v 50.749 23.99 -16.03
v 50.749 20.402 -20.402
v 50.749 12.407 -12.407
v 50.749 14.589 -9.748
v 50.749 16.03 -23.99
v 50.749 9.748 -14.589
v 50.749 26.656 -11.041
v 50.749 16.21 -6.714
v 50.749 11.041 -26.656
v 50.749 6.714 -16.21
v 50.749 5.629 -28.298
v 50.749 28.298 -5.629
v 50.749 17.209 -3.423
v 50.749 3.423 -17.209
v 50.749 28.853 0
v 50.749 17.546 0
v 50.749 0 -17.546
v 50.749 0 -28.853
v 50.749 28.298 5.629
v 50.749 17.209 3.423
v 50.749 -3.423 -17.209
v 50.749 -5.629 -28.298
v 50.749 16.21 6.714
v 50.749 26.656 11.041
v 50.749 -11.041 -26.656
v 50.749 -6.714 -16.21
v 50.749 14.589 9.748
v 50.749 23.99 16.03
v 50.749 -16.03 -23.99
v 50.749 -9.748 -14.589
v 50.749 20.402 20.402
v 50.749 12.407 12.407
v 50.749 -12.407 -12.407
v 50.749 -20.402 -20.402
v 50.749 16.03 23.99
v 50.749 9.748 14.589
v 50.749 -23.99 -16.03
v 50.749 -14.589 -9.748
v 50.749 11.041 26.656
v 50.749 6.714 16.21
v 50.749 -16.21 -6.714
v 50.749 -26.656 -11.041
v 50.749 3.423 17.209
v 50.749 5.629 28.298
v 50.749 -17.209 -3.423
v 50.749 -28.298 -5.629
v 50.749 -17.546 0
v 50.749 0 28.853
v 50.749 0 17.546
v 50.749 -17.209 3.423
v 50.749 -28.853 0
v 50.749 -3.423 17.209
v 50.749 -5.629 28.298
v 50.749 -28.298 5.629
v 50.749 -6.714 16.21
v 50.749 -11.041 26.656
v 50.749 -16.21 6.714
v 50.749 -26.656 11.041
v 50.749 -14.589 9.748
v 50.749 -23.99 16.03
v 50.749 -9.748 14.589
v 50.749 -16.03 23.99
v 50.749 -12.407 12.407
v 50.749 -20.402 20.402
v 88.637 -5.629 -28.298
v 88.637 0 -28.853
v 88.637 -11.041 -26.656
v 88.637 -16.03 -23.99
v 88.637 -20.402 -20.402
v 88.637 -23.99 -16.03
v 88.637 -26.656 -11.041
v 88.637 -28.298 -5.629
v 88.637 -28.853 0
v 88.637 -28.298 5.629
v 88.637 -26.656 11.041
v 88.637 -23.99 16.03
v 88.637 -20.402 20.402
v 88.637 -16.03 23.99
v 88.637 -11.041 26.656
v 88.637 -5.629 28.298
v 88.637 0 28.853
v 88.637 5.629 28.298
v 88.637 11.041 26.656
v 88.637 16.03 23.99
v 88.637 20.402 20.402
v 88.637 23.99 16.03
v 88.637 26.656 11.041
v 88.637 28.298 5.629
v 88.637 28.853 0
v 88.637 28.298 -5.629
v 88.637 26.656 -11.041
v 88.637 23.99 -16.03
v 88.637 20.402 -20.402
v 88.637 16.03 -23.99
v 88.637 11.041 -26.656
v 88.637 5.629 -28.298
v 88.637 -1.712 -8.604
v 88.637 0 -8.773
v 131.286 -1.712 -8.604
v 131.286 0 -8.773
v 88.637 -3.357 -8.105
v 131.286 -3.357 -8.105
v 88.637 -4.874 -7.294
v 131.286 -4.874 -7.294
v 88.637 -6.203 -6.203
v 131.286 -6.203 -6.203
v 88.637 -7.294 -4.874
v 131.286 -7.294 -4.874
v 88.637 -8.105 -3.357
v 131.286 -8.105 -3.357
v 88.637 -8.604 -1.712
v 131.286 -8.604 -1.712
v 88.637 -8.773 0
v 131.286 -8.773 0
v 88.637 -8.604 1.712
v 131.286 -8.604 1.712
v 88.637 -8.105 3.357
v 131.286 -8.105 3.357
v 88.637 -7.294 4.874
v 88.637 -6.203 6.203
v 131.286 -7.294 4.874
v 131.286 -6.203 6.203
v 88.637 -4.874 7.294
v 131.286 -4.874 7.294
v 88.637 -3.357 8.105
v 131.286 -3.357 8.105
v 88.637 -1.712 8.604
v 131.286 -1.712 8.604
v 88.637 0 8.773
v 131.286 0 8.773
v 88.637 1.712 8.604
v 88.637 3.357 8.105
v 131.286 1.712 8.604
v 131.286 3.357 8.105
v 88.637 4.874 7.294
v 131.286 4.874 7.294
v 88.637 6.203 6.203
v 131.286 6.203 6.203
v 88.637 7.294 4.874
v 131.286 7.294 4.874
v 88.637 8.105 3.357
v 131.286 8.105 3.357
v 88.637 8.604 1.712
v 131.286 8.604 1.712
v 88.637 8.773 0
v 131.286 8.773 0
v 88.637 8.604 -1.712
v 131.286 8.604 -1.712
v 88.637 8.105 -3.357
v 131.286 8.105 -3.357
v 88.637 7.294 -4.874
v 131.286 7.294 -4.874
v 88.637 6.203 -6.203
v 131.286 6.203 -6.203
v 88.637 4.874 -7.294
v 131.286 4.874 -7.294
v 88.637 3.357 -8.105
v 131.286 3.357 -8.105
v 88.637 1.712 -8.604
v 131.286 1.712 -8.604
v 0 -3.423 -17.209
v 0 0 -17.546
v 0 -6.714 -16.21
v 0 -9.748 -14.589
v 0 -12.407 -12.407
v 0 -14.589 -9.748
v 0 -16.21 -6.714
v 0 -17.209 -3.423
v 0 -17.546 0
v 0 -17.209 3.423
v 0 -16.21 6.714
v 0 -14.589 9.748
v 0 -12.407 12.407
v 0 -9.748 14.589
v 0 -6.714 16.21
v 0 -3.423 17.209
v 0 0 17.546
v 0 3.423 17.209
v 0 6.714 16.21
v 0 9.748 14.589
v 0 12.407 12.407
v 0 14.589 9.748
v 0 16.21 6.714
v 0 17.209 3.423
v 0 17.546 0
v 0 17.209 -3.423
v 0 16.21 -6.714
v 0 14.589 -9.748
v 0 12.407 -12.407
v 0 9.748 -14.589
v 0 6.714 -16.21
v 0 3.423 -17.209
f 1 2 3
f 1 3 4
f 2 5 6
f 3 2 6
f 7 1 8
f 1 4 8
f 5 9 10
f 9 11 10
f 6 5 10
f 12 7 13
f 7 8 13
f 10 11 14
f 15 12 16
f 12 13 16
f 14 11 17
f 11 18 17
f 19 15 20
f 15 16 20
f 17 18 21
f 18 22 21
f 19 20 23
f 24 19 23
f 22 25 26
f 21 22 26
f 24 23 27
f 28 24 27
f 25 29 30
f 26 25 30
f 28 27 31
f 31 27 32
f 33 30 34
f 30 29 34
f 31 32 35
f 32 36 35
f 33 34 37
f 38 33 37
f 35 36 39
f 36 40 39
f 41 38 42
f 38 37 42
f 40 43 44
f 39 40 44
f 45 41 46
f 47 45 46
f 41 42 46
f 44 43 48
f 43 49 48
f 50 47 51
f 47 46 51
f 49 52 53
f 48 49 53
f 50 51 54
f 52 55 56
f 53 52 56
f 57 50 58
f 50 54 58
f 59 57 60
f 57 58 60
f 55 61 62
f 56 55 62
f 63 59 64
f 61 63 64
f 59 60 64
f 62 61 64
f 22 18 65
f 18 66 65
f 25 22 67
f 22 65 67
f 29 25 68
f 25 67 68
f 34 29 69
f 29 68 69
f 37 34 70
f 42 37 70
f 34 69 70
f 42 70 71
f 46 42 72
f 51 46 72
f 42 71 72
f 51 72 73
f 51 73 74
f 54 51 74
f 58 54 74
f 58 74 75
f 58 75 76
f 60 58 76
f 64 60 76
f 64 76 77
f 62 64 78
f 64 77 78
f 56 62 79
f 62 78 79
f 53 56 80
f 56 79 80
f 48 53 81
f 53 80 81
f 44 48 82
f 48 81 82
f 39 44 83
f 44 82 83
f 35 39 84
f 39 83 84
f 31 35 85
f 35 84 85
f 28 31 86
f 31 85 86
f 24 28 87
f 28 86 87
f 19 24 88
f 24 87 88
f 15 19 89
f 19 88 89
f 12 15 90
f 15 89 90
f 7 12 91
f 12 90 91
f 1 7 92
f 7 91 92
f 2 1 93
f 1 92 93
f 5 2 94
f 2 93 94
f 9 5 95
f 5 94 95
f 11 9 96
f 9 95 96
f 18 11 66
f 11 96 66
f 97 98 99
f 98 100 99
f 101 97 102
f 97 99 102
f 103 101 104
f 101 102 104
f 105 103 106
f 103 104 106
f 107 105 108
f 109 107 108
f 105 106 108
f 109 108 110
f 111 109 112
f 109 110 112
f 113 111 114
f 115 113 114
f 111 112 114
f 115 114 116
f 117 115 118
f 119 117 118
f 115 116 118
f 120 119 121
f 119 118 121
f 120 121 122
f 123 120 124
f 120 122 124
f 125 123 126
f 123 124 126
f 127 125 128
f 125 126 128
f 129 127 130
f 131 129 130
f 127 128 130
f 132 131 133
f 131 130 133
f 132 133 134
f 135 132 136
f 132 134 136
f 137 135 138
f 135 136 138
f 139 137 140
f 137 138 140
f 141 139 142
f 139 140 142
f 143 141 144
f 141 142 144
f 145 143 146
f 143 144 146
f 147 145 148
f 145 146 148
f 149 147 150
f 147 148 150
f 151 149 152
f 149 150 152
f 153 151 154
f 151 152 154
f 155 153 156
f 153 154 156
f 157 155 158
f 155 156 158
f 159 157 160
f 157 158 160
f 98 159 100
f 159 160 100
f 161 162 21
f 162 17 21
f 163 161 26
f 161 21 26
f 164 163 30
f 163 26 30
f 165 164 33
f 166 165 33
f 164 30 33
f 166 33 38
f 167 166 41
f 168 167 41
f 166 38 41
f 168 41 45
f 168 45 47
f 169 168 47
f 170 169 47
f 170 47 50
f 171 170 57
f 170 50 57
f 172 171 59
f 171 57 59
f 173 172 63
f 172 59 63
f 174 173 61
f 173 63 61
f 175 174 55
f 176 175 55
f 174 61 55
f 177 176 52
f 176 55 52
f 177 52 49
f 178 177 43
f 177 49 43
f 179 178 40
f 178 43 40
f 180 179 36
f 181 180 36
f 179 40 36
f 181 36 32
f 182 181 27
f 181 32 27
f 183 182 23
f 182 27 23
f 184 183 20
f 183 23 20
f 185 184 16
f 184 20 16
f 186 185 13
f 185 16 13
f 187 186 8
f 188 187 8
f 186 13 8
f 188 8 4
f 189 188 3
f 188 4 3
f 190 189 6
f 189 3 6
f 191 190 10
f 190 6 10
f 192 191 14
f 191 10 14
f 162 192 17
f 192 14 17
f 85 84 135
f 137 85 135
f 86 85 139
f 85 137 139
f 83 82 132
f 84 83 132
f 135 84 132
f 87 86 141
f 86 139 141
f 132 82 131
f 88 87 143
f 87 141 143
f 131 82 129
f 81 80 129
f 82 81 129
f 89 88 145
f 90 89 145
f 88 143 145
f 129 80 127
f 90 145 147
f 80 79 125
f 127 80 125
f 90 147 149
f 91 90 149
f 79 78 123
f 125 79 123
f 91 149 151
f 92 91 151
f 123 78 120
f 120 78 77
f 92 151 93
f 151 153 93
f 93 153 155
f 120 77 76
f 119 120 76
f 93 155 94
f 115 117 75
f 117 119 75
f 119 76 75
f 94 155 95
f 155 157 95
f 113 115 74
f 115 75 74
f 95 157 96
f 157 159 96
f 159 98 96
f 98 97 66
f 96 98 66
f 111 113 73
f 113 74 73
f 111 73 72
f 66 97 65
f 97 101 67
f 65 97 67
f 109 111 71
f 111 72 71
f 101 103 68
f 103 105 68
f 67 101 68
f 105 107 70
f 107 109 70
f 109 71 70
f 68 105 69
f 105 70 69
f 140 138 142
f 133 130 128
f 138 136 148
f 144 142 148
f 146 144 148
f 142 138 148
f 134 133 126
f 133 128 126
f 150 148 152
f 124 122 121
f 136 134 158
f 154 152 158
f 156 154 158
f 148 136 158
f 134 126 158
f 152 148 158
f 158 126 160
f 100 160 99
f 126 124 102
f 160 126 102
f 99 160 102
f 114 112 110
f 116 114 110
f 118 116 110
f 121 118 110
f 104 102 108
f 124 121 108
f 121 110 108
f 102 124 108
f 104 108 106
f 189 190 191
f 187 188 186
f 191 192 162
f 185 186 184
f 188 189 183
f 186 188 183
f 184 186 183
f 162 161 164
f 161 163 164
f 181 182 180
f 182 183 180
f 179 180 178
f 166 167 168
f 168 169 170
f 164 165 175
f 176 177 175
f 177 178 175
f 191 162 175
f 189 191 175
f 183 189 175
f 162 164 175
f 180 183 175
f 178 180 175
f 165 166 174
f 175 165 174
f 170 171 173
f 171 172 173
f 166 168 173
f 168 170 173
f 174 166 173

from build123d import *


with BuildPart() as part:
    # Skica1 → Rotovat1 (revolve)
    with BuildSketch(Plane.XY, mode=Mode.PRIVATE) as rotovat1_sk:
        Polygon((0, 0), (0, 17.545735619), (50.749167087, 17.545735619), (50.749167087, 28.852573965), (88.636993826, 28.852573965), (88.636993826, 8.772867809), (131.285594605, 8.772867809), (131.285594605, 0), align=None)
    revolve(rotovat1_sk.sketch.rotate(Axis((131.285594605, 0, 0), (-1, 0, 0)), 90), axis=Axis((131.285594605, 0, 0), (-1, 0, 0)))  # turned: the seam where the file's is


solid = part.part
